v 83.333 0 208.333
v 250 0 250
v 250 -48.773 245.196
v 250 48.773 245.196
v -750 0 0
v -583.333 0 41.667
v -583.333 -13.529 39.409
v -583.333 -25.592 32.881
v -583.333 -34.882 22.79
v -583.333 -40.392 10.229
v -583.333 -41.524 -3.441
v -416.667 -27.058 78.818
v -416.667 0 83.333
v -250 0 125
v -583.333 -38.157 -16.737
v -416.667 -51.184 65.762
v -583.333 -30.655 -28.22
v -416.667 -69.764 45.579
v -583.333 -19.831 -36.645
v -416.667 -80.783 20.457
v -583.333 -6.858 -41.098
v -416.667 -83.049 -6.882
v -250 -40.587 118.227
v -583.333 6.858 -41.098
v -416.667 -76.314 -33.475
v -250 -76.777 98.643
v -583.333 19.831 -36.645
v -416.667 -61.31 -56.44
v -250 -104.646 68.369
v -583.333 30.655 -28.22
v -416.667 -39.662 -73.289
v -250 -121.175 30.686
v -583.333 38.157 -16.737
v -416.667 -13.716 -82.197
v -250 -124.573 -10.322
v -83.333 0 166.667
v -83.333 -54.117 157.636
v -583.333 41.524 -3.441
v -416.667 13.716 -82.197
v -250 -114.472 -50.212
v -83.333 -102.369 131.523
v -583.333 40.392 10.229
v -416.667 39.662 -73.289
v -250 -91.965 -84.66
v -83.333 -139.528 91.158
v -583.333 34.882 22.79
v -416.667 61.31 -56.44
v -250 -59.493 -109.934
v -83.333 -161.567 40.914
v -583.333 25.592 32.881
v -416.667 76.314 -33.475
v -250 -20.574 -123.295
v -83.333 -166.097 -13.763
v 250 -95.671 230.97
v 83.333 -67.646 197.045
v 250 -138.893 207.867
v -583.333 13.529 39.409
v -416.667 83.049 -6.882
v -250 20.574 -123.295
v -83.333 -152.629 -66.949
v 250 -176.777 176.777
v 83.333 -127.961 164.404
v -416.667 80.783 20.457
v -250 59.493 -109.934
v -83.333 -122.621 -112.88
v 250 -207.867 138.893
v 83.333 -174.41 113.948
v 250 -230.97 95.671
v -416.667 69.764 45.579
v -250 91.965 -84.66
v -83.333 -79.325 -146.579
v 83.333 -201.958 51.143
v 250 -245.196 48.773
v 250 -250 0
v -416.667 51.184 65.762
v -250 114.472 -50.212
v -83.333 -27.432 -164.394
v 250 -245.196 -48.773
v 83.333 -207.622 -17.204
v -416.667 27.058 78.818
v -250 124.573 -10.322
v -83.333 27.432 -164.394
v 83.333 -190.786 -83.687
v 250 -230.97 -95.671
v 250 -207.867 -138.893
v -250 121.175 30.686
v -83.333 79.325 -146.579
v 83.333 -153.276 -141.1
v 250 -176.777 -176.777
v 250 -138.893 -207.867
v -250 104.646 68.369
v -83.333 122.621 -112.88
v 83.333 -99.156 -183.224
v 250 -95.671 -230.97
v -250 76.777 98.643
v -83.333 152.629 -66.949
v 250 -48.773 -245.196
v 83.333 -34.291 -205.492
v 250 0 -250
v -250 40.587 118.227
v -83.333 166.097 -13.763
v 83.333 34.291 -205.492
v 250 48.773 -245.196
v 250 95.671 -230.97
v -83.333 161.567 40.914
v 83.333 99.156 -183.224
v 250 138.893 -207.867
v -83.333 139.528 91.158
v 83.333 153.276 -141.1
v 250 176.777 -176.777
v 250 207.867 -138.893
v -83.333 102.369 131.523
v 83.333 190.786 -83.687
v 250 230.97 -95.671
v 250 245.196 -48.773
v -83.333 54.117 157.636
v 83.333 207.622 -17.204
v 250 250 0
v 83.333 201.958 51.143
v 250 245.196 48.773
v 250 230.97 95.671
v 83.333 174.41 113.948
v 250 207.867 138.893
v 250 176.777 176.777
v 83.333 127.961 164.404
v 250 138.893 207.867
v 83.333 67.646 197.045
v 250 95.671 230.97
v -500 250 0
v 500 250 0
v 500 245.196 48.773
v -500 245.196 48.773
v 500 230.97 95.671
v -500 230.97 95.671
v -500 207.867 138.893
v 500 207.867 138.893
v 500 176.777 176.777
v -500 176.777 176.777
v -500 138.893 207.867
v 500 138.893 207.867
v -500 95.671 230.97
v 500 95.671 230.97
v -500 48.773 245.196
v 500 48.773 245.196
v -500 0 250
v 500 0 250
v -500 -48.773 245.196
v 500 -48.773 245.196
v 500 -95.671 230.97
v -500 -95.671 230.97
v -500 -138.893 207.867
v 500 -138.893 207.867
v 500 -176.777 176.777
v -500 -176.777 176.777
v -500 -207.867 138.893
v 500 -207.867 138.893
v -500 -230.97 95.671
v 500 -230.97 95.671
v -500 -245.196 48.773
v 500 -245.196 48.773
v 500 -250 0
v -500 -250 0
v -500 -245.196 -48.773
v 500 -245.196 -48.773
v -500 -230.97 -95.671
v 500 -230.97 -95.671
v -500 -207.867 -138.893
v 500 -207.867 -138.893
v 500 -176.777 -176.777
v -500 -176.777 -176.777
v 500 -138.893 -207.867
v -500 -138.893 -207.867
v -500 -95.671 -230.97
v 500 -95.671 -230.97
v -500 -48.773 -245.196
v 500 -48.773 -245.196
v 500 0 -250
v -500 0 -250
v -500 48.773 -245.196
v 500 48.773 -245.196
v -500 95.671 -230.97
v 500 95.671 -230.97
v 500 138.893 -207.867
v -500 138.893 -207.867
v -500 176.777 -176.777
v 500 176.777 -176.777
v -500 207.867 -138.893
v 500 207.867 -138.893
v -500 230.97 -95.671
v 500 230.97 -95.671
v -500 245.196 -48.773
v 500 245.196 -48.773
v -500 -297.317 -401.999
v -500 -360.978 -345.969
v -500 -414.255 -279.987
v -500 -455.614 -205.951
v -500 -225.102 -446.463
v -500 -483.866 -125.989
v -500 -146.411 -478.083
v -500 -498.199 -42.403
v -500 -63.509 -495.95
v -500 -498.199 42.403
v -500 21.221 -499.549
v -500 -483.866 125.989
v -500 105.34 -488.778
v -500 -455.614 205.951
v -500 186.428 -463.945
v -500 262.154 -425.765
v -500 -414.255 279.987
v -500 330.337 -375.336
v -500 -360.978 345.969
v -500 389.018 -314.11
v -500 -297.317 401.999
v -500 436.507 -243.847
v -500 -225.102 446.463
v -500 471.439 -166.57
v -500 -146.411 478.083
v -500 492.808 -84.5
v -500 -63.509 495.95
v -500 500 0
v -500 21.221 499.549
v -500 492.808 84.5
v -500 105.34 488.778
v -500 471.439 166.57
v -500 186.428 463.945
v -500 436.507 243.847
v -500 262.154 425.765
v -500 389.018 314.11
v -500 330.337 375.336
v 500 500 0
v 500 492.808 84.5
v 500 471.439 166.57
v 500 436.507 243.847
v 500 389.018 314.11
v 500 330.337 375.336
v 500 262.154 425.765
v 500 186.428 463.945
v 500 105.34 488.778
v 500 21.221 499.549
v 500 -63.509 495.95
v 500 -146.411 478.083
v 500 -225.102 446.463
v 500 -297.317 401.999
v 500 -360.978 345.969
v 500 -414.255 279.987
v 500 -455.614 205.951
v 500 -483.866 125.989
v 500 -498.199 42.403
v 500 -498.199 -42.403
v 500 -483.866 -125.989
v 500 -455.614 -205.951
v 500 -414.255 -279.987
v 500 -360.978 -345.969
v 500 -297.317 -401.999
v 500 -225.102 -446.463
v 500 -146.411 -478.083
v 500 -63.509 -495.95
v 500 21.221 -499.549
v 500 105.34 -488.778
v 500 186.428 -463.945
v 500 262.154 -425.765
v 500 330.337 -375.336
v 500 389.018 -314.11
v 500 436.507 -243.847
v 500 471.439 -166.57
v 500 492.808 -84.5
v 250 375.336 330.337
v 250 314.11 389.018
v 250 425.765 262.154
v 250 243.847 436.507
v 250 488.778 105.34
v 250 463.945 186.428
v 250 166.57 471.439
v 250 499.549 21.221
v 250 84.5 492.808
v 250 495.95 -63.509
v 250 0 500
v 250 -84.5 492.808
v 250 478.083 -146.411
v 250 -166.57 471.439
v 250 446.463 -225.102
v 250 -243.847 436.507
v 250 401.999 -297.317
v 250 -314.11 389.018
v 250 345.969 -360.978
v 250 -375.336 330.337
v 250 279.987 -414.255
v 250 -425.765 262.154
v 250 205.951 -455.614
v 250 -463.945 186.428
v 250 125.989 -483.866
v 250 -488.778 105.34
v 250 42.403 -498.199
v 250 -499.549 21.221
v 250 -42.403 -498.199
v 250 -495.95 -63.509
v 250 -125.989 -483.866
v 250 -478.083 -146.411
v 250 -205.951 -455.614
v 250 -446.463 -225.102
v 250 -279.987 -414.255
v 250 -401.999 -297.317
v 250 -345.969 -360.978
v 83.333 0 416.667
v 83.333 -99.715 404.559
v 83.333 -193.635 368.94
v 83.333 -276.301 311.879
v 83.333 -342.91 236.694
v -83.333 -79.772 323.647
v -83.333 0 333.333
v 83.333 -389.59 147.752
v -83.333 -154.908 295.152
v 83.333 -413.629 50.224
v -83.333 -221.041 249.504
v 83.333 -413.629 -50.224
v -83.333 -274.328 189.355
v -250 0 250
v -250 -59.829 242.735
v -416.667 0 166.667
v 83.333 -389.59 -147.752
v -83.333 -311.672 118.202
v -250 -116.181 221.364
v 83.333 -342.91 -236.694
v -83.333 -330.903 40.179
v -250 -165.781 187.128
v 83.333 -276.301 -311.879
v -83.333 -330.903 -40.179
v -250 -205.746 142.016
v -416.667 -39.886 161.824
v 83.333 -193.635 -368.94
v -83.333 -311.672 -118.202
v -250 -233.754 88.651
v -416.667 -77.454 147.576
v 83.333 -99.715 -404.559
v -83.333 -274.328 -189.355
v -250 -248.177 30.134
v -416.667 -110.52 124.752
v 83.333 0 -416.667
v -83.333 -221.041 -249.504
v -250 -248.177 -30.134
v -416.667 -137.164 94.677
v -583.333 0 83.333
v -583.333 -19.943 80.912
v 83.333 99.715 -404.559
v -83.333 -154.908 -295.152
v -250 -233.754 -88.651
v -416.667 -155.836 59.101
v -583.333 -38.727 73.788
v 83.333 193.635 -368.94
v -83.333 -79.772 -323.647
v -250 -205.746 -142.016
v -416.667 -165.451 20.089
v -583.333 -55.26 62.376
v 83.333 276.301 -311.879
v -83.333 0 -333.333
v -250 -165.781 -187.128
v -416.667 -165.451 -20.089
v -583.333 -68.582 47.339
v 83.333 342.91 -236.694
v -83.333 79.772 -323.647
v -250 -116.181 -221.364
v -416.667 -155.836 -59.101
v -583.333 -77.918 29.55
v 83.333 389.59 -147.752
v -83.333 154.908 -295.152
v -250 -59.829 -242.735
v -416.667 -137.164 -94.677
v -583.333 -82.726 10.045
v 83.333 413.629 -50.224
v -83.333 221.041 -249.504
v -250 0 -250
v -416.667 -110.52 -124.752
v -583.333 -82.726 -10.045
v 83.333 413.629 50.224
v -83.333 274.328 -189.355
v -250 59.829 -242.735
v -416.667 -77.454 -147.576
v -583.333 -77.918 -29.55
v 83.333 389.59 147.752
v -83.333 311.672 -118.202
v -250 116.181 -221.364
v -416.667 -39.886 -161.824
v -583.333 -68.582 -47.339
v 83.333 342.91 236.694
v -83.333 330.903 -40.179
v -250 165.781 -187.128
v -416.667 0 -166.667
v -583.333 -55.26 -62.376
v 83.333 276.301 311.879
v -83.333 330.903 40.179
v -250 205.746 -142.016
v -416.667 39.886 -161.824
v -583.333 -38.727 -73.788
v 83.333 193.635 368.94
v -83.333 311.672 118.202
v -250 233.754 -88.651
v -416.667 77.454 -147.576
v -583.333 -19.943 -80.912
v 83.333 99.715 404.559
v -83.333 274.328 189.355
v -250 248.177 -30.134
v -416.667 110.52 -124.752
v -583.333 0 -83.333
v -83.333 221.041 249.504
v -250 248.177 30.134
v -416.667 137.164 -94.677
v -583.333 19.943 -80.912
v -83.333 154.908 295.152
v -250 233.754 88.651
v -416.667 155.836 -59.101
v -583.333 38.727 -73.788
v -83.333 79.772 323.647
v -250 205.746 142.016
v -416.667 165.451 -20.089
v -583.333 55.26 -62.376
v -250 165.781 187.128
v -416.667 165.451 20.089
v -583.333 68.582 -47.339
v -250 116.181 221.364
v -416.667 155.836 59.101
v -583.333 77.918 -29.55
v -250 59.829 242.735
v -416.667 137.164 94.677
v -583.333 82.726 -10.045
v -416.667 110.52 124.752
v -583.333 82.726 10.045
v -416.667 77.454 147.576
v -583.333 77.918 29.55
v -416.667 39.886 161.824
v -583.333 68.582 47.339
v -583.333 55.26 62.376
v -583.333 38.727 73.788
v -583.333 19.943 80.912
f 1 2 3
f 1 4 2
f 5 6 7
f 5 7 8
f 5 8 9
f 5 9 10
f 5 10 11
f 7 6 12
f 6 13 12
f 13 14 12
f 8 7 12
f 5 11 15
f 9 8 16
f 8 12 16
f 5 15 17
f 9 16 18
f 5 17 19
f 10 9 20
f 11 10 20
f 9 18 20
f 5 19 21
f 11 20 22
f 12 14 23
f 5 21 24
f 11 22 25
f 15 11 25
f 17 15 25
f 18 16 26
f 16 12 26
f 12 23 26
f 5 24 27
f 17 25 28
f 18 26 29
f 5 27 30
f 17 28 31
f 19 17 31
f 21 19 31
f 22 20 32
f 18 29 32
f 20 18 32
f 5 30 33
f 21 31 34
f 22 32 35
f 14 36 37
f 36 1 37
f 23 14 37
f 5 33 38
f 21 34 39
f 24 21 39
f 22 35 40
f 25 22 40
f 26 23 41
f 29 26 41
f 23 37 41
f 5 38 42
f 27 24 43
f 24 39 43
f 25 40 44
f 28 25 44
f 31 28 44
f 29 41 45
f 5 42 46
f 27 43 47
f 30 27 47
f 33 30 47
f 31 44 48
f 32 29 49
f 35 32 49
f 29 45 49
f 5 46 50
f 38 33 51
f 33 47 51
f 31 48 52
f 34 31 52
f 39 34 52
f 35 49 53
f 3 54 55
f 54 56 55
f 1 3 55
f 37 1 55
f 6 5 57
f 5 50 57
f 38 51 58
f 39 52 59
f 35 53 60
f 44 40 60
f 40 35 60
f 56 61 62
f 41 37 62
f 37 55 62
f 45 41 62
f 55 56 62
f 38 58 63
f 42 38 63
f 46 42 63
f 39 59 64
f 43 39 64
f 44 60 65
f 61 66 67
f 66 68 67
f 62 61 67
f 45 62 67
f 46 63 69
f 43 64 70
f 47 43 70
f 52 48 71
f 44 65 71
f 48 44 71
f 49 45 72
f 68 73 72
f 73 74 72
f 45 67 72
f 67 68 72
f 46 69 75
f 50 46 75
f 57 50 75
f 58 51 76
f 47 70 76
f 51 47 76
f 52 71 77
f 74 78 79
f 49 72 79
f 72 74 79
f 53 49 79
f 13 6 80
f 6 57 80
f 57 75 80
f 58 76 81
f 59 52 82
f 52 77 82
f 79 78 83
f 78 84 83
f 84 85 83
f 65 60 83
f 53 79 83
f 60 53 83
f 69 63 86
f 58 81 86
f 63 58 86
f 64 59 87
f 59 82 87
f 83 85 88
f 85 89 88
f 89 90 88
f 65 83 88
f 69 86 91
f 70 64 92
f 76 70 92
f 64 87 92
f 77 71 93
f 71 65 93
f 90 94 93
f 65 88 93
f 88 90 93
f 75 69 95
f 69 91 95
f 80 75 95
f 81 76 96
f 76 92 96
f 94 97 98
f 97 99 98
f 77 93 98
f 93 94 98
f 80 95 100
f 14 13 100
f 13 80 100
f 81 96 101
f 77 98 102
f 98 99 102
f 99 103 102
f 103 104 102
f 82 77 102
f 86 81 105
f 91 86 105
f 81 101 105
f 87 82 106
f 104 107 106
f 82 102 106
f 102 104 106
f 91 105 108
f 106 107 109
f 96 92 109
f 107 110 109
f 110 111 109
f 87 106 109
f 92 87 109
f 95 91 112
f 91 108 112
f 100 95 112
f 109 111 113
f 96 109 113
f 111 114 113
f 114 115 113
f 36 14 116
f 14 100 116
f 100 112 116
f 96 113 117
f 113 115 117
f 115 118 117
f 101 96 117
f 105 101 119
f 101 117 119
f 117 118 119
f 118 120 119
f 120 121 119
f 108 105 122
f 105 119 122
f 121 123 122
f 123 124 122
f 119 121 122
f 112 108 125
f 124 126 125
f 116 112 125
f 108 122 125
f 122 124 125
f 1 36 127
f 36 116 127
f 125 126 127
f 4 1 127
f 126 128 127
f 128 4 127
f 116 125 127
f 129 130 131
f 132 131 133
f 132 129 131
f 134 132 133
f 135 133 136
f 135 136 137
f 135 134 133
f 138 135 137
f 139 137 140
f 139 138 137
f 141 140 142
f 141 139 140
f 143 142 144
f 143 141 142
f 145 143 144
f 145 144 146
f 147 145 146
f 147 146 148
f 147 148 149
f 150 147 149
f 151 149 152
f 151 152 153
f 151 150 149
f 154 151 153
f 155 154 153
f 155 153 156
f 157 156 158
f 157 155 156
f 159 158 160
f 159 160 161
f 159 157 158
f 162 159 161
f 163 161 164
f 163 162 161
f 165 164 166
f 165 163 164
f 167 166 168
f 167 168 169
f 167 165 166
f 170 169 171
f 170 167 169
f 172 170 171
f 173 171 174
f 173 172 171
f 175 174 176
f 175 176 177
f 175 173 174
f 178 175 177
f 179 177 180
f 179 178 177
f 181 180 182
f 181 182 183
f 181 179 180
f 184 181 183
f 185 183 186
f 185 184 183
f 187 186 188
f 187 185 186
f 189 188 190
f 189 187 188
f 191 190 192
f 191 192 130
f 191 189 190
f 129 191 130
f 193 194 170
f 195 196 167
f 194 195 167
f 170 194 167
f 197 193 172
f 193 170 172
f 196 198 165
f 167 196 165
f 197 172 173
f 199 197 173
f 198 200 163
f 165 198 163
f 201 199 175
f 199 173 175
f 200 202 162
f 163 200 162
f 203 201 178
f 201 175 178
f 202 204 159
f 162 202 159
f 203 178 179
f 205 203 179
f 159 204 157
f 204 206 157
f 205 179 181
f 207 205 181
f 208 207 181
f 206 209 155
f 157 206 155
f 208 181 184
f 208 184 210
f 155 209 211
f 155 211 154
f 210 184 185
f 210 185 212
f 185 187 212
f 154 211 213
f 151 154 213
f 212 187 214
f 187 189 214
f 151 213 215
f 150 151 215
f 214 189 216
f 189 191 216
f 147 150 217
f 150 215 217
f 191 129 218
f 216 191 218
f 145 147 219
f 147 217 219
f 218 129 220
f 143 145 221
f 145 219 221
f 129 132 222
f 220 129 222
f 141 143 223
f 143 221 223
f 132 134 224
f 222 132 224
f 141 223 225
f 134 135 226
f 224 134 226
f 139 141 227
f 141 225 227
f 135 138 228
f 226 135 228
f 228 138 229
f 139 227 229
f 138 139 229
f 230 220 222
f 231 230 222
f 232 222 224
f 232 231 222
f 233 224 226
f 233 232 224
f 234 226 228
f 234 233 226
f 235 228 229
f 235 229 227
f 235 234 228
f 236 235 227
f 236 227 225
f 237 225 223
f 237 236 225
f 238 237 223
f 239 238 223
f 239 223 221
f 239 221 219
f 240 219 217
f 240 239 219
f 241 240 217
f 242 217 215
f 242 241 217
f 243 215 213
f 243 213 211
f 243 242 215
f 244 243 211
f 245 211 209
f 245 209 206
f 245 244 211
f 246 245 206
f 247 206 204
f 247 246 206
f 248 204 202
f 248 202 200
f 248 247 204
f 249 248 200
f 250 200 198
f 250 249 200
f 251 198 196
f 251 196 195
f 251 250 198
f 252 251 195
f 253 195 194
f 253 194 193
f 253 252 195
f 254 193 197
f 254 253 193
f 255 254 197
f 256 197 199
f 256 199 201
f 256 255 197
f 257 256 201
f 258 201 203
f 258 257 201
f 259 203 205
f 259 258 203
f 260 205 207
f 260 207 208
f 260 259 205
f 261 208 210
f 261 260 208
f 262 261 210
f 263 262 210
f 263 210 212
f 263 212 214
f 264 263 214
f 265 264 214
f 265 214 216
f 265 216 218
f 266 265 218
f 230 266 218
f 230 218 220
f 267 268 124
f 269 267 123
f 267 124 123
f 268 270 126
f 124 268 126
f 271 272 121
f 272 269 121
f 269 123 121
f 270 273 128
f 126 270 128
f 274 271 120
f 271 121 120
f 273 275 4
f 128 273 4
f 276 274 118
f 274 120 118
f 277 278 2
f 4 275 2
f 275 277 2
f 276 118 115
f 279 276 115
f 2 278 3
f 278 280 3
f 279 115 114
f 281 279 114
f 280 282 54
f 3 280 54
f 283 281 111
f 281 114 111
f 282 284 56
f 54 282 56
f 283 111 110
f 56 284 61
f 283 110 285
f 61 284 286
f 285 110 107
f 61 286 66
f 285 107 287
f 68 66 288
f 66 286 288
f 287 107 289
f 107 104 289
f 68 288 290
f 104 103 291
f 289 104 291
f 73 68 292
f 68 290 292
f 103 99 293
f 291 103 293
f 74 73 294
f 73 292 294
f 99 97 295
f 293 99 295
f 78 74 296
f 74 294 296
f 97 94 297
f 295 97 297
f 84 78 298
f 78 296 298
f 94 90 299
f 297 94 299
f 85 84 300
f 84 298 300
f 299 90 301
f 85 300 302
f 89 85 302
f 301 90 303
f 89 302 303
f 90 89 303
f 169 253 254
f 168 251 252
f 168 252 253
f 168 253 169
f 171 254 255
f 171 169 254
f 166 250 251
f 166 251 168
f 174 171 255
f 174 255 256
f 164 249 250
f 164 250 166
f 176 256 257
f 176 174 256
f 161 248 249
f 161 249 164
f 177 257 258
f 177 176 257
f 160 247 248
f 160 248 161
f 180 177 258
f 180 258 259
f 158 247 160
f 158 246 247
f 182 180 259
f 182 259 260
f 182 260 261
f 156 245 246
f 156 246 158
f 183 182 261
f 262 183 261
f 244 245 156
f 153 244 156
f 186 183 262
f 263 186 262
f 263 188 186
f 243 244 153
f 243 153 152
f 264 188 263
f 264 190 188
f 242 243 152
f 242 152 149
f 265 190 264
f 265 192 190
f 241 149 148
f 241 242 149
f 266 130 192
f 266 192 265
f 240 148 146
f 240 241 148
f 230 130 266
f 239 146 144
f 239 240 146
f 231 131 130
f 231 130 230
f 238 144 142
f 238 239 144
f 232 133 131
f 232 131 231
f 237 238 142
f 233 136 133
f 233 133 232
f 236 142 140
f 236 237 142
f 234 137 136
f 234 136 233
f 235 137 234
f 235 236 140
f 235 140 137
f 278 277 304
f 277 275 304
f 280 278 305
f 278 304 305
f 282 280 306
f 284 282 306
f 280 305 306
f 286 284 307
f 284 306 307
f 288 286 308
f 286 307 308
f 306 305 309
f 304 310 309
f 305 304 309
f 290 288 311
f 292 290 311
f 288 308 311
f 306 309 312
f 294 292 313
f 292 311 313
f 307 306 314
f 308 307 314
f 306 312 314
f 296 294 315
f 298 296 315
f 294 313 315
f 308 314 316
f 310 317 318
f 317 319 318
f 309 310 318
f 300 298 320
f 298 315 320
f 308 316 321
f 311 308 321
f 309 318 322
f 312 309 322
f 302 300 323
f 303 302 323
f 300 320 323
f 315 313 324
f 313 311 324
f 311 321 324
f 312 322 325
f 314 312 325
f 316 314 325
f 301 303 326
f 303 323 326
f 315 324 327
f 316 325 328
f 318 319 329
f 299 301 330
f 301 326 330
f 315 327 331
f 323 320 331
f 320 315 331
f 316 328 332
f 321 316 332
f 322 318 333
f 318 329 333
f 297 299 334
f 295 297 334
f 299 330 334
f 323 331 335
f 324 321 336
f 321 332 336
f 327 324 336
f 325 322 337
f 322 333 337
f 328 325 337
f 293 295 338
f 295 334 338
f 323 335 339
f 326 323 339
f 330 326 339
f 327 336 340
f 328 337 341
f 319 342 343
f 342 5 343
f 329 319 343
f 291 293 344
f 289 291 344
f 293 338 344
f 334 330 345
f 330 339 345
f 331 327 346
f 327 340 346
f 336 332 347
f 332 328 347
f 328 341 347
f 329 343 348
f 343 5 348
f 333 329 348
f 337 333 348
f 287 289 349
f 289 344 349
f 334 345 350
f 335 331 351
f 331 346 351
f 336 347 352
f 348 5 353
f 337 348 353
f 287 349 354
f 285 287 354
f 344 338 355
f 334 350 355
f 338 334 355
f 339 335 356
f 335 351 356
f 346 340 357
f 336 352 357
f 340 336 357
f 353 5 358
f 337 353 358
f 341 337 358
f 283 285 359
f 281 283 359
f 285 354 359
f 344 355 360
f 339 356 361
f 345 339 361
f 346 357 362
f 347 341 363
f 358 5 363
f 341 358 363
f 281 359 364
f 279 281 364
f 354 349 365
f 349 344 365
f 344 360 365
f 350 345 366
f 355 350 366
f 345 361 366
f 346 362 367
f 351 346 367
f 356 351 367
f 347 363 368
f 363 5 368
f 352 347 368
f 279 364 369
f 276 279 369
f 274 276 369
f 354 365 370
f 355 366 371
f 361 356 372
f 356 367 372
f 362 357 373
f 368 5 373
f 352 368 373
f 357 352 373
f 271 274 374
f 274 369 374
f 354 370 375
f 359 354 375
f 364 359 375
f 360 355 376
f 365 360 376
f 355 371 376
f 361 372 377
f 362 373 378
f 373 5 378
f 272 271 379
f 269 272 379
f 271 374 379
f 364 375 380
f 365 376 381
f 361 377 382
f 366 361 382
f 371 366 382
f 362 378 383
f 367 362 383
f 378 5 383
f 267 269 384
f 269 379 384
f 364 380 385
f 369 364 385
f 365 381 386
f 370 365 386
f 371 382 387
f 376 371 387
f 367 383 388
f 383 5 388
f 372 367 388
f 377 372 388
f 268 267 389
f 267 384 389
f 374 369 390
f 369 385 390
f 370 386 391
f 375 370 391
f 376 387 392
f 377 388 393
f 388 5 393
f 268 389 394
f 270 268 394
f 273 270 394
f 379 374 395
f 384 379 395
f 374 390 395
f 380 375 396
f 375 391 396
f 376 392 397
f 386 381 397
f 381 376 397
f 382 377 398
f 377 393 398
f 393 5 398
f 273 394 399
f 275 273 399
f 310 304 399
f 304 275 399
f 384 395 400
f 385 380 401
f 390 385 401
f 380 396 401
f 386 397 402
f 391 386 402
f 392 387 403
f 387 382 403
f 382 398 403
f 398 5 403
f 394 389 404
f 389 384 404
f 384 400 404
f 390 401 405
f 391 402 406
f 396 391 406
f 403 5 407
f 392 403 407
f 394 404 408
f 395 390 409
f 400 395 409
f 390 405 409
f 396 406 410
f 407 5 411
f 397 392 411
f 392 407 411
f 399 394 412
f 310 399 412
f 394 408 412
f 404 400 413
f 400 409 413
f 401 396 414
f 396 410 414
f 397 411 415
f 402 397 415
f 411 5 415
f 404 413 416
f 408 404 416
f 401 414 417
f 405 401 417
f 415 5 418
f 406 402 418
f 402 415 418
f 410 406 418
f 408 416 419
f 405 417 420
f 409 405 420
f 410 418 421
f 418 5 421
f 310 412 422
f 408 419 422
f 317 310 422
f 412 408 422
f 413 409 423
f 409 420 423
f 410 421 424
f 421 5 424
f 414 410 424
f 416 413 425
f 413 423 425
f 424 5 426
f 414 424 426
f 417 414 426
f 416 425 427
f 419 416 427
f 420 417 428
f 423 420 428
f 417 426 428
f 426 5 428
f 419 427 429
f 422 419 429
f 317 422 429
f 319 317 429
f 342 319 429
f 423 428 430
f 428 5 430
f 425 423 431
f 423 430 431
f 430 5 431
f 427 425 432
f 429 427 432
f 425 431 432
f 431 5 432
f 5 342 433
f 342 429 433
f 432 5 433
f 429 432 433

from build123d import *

# Parameters (mm, degrees)
SKETCH_R   = 500
SKETCH_R_2 = 250
PAD_DEPTH  = 500


with BuildPart() as body:
    # Sketch → Pad (new body, symmetric)
    with BuildSketch(Plane.YZ):
        Circle(SKETCH_R)
        Circle(SKETCH_R_2, mode=Mode.SUBTRACT)
    extrude(amount=PAD_DEPTH, both=True)


with BuildPart() as body001:
    # Sketch001 → Revolution (revolve)
    with BuildSketch(Plane.XZ):
        Polygon((250, 500), (-750, 0), (250, 250), align=None)
    revolve(axis=Axis((0, 0, 0), (1, 0, 0)))


solid = Compound([body.part, body001.part])
